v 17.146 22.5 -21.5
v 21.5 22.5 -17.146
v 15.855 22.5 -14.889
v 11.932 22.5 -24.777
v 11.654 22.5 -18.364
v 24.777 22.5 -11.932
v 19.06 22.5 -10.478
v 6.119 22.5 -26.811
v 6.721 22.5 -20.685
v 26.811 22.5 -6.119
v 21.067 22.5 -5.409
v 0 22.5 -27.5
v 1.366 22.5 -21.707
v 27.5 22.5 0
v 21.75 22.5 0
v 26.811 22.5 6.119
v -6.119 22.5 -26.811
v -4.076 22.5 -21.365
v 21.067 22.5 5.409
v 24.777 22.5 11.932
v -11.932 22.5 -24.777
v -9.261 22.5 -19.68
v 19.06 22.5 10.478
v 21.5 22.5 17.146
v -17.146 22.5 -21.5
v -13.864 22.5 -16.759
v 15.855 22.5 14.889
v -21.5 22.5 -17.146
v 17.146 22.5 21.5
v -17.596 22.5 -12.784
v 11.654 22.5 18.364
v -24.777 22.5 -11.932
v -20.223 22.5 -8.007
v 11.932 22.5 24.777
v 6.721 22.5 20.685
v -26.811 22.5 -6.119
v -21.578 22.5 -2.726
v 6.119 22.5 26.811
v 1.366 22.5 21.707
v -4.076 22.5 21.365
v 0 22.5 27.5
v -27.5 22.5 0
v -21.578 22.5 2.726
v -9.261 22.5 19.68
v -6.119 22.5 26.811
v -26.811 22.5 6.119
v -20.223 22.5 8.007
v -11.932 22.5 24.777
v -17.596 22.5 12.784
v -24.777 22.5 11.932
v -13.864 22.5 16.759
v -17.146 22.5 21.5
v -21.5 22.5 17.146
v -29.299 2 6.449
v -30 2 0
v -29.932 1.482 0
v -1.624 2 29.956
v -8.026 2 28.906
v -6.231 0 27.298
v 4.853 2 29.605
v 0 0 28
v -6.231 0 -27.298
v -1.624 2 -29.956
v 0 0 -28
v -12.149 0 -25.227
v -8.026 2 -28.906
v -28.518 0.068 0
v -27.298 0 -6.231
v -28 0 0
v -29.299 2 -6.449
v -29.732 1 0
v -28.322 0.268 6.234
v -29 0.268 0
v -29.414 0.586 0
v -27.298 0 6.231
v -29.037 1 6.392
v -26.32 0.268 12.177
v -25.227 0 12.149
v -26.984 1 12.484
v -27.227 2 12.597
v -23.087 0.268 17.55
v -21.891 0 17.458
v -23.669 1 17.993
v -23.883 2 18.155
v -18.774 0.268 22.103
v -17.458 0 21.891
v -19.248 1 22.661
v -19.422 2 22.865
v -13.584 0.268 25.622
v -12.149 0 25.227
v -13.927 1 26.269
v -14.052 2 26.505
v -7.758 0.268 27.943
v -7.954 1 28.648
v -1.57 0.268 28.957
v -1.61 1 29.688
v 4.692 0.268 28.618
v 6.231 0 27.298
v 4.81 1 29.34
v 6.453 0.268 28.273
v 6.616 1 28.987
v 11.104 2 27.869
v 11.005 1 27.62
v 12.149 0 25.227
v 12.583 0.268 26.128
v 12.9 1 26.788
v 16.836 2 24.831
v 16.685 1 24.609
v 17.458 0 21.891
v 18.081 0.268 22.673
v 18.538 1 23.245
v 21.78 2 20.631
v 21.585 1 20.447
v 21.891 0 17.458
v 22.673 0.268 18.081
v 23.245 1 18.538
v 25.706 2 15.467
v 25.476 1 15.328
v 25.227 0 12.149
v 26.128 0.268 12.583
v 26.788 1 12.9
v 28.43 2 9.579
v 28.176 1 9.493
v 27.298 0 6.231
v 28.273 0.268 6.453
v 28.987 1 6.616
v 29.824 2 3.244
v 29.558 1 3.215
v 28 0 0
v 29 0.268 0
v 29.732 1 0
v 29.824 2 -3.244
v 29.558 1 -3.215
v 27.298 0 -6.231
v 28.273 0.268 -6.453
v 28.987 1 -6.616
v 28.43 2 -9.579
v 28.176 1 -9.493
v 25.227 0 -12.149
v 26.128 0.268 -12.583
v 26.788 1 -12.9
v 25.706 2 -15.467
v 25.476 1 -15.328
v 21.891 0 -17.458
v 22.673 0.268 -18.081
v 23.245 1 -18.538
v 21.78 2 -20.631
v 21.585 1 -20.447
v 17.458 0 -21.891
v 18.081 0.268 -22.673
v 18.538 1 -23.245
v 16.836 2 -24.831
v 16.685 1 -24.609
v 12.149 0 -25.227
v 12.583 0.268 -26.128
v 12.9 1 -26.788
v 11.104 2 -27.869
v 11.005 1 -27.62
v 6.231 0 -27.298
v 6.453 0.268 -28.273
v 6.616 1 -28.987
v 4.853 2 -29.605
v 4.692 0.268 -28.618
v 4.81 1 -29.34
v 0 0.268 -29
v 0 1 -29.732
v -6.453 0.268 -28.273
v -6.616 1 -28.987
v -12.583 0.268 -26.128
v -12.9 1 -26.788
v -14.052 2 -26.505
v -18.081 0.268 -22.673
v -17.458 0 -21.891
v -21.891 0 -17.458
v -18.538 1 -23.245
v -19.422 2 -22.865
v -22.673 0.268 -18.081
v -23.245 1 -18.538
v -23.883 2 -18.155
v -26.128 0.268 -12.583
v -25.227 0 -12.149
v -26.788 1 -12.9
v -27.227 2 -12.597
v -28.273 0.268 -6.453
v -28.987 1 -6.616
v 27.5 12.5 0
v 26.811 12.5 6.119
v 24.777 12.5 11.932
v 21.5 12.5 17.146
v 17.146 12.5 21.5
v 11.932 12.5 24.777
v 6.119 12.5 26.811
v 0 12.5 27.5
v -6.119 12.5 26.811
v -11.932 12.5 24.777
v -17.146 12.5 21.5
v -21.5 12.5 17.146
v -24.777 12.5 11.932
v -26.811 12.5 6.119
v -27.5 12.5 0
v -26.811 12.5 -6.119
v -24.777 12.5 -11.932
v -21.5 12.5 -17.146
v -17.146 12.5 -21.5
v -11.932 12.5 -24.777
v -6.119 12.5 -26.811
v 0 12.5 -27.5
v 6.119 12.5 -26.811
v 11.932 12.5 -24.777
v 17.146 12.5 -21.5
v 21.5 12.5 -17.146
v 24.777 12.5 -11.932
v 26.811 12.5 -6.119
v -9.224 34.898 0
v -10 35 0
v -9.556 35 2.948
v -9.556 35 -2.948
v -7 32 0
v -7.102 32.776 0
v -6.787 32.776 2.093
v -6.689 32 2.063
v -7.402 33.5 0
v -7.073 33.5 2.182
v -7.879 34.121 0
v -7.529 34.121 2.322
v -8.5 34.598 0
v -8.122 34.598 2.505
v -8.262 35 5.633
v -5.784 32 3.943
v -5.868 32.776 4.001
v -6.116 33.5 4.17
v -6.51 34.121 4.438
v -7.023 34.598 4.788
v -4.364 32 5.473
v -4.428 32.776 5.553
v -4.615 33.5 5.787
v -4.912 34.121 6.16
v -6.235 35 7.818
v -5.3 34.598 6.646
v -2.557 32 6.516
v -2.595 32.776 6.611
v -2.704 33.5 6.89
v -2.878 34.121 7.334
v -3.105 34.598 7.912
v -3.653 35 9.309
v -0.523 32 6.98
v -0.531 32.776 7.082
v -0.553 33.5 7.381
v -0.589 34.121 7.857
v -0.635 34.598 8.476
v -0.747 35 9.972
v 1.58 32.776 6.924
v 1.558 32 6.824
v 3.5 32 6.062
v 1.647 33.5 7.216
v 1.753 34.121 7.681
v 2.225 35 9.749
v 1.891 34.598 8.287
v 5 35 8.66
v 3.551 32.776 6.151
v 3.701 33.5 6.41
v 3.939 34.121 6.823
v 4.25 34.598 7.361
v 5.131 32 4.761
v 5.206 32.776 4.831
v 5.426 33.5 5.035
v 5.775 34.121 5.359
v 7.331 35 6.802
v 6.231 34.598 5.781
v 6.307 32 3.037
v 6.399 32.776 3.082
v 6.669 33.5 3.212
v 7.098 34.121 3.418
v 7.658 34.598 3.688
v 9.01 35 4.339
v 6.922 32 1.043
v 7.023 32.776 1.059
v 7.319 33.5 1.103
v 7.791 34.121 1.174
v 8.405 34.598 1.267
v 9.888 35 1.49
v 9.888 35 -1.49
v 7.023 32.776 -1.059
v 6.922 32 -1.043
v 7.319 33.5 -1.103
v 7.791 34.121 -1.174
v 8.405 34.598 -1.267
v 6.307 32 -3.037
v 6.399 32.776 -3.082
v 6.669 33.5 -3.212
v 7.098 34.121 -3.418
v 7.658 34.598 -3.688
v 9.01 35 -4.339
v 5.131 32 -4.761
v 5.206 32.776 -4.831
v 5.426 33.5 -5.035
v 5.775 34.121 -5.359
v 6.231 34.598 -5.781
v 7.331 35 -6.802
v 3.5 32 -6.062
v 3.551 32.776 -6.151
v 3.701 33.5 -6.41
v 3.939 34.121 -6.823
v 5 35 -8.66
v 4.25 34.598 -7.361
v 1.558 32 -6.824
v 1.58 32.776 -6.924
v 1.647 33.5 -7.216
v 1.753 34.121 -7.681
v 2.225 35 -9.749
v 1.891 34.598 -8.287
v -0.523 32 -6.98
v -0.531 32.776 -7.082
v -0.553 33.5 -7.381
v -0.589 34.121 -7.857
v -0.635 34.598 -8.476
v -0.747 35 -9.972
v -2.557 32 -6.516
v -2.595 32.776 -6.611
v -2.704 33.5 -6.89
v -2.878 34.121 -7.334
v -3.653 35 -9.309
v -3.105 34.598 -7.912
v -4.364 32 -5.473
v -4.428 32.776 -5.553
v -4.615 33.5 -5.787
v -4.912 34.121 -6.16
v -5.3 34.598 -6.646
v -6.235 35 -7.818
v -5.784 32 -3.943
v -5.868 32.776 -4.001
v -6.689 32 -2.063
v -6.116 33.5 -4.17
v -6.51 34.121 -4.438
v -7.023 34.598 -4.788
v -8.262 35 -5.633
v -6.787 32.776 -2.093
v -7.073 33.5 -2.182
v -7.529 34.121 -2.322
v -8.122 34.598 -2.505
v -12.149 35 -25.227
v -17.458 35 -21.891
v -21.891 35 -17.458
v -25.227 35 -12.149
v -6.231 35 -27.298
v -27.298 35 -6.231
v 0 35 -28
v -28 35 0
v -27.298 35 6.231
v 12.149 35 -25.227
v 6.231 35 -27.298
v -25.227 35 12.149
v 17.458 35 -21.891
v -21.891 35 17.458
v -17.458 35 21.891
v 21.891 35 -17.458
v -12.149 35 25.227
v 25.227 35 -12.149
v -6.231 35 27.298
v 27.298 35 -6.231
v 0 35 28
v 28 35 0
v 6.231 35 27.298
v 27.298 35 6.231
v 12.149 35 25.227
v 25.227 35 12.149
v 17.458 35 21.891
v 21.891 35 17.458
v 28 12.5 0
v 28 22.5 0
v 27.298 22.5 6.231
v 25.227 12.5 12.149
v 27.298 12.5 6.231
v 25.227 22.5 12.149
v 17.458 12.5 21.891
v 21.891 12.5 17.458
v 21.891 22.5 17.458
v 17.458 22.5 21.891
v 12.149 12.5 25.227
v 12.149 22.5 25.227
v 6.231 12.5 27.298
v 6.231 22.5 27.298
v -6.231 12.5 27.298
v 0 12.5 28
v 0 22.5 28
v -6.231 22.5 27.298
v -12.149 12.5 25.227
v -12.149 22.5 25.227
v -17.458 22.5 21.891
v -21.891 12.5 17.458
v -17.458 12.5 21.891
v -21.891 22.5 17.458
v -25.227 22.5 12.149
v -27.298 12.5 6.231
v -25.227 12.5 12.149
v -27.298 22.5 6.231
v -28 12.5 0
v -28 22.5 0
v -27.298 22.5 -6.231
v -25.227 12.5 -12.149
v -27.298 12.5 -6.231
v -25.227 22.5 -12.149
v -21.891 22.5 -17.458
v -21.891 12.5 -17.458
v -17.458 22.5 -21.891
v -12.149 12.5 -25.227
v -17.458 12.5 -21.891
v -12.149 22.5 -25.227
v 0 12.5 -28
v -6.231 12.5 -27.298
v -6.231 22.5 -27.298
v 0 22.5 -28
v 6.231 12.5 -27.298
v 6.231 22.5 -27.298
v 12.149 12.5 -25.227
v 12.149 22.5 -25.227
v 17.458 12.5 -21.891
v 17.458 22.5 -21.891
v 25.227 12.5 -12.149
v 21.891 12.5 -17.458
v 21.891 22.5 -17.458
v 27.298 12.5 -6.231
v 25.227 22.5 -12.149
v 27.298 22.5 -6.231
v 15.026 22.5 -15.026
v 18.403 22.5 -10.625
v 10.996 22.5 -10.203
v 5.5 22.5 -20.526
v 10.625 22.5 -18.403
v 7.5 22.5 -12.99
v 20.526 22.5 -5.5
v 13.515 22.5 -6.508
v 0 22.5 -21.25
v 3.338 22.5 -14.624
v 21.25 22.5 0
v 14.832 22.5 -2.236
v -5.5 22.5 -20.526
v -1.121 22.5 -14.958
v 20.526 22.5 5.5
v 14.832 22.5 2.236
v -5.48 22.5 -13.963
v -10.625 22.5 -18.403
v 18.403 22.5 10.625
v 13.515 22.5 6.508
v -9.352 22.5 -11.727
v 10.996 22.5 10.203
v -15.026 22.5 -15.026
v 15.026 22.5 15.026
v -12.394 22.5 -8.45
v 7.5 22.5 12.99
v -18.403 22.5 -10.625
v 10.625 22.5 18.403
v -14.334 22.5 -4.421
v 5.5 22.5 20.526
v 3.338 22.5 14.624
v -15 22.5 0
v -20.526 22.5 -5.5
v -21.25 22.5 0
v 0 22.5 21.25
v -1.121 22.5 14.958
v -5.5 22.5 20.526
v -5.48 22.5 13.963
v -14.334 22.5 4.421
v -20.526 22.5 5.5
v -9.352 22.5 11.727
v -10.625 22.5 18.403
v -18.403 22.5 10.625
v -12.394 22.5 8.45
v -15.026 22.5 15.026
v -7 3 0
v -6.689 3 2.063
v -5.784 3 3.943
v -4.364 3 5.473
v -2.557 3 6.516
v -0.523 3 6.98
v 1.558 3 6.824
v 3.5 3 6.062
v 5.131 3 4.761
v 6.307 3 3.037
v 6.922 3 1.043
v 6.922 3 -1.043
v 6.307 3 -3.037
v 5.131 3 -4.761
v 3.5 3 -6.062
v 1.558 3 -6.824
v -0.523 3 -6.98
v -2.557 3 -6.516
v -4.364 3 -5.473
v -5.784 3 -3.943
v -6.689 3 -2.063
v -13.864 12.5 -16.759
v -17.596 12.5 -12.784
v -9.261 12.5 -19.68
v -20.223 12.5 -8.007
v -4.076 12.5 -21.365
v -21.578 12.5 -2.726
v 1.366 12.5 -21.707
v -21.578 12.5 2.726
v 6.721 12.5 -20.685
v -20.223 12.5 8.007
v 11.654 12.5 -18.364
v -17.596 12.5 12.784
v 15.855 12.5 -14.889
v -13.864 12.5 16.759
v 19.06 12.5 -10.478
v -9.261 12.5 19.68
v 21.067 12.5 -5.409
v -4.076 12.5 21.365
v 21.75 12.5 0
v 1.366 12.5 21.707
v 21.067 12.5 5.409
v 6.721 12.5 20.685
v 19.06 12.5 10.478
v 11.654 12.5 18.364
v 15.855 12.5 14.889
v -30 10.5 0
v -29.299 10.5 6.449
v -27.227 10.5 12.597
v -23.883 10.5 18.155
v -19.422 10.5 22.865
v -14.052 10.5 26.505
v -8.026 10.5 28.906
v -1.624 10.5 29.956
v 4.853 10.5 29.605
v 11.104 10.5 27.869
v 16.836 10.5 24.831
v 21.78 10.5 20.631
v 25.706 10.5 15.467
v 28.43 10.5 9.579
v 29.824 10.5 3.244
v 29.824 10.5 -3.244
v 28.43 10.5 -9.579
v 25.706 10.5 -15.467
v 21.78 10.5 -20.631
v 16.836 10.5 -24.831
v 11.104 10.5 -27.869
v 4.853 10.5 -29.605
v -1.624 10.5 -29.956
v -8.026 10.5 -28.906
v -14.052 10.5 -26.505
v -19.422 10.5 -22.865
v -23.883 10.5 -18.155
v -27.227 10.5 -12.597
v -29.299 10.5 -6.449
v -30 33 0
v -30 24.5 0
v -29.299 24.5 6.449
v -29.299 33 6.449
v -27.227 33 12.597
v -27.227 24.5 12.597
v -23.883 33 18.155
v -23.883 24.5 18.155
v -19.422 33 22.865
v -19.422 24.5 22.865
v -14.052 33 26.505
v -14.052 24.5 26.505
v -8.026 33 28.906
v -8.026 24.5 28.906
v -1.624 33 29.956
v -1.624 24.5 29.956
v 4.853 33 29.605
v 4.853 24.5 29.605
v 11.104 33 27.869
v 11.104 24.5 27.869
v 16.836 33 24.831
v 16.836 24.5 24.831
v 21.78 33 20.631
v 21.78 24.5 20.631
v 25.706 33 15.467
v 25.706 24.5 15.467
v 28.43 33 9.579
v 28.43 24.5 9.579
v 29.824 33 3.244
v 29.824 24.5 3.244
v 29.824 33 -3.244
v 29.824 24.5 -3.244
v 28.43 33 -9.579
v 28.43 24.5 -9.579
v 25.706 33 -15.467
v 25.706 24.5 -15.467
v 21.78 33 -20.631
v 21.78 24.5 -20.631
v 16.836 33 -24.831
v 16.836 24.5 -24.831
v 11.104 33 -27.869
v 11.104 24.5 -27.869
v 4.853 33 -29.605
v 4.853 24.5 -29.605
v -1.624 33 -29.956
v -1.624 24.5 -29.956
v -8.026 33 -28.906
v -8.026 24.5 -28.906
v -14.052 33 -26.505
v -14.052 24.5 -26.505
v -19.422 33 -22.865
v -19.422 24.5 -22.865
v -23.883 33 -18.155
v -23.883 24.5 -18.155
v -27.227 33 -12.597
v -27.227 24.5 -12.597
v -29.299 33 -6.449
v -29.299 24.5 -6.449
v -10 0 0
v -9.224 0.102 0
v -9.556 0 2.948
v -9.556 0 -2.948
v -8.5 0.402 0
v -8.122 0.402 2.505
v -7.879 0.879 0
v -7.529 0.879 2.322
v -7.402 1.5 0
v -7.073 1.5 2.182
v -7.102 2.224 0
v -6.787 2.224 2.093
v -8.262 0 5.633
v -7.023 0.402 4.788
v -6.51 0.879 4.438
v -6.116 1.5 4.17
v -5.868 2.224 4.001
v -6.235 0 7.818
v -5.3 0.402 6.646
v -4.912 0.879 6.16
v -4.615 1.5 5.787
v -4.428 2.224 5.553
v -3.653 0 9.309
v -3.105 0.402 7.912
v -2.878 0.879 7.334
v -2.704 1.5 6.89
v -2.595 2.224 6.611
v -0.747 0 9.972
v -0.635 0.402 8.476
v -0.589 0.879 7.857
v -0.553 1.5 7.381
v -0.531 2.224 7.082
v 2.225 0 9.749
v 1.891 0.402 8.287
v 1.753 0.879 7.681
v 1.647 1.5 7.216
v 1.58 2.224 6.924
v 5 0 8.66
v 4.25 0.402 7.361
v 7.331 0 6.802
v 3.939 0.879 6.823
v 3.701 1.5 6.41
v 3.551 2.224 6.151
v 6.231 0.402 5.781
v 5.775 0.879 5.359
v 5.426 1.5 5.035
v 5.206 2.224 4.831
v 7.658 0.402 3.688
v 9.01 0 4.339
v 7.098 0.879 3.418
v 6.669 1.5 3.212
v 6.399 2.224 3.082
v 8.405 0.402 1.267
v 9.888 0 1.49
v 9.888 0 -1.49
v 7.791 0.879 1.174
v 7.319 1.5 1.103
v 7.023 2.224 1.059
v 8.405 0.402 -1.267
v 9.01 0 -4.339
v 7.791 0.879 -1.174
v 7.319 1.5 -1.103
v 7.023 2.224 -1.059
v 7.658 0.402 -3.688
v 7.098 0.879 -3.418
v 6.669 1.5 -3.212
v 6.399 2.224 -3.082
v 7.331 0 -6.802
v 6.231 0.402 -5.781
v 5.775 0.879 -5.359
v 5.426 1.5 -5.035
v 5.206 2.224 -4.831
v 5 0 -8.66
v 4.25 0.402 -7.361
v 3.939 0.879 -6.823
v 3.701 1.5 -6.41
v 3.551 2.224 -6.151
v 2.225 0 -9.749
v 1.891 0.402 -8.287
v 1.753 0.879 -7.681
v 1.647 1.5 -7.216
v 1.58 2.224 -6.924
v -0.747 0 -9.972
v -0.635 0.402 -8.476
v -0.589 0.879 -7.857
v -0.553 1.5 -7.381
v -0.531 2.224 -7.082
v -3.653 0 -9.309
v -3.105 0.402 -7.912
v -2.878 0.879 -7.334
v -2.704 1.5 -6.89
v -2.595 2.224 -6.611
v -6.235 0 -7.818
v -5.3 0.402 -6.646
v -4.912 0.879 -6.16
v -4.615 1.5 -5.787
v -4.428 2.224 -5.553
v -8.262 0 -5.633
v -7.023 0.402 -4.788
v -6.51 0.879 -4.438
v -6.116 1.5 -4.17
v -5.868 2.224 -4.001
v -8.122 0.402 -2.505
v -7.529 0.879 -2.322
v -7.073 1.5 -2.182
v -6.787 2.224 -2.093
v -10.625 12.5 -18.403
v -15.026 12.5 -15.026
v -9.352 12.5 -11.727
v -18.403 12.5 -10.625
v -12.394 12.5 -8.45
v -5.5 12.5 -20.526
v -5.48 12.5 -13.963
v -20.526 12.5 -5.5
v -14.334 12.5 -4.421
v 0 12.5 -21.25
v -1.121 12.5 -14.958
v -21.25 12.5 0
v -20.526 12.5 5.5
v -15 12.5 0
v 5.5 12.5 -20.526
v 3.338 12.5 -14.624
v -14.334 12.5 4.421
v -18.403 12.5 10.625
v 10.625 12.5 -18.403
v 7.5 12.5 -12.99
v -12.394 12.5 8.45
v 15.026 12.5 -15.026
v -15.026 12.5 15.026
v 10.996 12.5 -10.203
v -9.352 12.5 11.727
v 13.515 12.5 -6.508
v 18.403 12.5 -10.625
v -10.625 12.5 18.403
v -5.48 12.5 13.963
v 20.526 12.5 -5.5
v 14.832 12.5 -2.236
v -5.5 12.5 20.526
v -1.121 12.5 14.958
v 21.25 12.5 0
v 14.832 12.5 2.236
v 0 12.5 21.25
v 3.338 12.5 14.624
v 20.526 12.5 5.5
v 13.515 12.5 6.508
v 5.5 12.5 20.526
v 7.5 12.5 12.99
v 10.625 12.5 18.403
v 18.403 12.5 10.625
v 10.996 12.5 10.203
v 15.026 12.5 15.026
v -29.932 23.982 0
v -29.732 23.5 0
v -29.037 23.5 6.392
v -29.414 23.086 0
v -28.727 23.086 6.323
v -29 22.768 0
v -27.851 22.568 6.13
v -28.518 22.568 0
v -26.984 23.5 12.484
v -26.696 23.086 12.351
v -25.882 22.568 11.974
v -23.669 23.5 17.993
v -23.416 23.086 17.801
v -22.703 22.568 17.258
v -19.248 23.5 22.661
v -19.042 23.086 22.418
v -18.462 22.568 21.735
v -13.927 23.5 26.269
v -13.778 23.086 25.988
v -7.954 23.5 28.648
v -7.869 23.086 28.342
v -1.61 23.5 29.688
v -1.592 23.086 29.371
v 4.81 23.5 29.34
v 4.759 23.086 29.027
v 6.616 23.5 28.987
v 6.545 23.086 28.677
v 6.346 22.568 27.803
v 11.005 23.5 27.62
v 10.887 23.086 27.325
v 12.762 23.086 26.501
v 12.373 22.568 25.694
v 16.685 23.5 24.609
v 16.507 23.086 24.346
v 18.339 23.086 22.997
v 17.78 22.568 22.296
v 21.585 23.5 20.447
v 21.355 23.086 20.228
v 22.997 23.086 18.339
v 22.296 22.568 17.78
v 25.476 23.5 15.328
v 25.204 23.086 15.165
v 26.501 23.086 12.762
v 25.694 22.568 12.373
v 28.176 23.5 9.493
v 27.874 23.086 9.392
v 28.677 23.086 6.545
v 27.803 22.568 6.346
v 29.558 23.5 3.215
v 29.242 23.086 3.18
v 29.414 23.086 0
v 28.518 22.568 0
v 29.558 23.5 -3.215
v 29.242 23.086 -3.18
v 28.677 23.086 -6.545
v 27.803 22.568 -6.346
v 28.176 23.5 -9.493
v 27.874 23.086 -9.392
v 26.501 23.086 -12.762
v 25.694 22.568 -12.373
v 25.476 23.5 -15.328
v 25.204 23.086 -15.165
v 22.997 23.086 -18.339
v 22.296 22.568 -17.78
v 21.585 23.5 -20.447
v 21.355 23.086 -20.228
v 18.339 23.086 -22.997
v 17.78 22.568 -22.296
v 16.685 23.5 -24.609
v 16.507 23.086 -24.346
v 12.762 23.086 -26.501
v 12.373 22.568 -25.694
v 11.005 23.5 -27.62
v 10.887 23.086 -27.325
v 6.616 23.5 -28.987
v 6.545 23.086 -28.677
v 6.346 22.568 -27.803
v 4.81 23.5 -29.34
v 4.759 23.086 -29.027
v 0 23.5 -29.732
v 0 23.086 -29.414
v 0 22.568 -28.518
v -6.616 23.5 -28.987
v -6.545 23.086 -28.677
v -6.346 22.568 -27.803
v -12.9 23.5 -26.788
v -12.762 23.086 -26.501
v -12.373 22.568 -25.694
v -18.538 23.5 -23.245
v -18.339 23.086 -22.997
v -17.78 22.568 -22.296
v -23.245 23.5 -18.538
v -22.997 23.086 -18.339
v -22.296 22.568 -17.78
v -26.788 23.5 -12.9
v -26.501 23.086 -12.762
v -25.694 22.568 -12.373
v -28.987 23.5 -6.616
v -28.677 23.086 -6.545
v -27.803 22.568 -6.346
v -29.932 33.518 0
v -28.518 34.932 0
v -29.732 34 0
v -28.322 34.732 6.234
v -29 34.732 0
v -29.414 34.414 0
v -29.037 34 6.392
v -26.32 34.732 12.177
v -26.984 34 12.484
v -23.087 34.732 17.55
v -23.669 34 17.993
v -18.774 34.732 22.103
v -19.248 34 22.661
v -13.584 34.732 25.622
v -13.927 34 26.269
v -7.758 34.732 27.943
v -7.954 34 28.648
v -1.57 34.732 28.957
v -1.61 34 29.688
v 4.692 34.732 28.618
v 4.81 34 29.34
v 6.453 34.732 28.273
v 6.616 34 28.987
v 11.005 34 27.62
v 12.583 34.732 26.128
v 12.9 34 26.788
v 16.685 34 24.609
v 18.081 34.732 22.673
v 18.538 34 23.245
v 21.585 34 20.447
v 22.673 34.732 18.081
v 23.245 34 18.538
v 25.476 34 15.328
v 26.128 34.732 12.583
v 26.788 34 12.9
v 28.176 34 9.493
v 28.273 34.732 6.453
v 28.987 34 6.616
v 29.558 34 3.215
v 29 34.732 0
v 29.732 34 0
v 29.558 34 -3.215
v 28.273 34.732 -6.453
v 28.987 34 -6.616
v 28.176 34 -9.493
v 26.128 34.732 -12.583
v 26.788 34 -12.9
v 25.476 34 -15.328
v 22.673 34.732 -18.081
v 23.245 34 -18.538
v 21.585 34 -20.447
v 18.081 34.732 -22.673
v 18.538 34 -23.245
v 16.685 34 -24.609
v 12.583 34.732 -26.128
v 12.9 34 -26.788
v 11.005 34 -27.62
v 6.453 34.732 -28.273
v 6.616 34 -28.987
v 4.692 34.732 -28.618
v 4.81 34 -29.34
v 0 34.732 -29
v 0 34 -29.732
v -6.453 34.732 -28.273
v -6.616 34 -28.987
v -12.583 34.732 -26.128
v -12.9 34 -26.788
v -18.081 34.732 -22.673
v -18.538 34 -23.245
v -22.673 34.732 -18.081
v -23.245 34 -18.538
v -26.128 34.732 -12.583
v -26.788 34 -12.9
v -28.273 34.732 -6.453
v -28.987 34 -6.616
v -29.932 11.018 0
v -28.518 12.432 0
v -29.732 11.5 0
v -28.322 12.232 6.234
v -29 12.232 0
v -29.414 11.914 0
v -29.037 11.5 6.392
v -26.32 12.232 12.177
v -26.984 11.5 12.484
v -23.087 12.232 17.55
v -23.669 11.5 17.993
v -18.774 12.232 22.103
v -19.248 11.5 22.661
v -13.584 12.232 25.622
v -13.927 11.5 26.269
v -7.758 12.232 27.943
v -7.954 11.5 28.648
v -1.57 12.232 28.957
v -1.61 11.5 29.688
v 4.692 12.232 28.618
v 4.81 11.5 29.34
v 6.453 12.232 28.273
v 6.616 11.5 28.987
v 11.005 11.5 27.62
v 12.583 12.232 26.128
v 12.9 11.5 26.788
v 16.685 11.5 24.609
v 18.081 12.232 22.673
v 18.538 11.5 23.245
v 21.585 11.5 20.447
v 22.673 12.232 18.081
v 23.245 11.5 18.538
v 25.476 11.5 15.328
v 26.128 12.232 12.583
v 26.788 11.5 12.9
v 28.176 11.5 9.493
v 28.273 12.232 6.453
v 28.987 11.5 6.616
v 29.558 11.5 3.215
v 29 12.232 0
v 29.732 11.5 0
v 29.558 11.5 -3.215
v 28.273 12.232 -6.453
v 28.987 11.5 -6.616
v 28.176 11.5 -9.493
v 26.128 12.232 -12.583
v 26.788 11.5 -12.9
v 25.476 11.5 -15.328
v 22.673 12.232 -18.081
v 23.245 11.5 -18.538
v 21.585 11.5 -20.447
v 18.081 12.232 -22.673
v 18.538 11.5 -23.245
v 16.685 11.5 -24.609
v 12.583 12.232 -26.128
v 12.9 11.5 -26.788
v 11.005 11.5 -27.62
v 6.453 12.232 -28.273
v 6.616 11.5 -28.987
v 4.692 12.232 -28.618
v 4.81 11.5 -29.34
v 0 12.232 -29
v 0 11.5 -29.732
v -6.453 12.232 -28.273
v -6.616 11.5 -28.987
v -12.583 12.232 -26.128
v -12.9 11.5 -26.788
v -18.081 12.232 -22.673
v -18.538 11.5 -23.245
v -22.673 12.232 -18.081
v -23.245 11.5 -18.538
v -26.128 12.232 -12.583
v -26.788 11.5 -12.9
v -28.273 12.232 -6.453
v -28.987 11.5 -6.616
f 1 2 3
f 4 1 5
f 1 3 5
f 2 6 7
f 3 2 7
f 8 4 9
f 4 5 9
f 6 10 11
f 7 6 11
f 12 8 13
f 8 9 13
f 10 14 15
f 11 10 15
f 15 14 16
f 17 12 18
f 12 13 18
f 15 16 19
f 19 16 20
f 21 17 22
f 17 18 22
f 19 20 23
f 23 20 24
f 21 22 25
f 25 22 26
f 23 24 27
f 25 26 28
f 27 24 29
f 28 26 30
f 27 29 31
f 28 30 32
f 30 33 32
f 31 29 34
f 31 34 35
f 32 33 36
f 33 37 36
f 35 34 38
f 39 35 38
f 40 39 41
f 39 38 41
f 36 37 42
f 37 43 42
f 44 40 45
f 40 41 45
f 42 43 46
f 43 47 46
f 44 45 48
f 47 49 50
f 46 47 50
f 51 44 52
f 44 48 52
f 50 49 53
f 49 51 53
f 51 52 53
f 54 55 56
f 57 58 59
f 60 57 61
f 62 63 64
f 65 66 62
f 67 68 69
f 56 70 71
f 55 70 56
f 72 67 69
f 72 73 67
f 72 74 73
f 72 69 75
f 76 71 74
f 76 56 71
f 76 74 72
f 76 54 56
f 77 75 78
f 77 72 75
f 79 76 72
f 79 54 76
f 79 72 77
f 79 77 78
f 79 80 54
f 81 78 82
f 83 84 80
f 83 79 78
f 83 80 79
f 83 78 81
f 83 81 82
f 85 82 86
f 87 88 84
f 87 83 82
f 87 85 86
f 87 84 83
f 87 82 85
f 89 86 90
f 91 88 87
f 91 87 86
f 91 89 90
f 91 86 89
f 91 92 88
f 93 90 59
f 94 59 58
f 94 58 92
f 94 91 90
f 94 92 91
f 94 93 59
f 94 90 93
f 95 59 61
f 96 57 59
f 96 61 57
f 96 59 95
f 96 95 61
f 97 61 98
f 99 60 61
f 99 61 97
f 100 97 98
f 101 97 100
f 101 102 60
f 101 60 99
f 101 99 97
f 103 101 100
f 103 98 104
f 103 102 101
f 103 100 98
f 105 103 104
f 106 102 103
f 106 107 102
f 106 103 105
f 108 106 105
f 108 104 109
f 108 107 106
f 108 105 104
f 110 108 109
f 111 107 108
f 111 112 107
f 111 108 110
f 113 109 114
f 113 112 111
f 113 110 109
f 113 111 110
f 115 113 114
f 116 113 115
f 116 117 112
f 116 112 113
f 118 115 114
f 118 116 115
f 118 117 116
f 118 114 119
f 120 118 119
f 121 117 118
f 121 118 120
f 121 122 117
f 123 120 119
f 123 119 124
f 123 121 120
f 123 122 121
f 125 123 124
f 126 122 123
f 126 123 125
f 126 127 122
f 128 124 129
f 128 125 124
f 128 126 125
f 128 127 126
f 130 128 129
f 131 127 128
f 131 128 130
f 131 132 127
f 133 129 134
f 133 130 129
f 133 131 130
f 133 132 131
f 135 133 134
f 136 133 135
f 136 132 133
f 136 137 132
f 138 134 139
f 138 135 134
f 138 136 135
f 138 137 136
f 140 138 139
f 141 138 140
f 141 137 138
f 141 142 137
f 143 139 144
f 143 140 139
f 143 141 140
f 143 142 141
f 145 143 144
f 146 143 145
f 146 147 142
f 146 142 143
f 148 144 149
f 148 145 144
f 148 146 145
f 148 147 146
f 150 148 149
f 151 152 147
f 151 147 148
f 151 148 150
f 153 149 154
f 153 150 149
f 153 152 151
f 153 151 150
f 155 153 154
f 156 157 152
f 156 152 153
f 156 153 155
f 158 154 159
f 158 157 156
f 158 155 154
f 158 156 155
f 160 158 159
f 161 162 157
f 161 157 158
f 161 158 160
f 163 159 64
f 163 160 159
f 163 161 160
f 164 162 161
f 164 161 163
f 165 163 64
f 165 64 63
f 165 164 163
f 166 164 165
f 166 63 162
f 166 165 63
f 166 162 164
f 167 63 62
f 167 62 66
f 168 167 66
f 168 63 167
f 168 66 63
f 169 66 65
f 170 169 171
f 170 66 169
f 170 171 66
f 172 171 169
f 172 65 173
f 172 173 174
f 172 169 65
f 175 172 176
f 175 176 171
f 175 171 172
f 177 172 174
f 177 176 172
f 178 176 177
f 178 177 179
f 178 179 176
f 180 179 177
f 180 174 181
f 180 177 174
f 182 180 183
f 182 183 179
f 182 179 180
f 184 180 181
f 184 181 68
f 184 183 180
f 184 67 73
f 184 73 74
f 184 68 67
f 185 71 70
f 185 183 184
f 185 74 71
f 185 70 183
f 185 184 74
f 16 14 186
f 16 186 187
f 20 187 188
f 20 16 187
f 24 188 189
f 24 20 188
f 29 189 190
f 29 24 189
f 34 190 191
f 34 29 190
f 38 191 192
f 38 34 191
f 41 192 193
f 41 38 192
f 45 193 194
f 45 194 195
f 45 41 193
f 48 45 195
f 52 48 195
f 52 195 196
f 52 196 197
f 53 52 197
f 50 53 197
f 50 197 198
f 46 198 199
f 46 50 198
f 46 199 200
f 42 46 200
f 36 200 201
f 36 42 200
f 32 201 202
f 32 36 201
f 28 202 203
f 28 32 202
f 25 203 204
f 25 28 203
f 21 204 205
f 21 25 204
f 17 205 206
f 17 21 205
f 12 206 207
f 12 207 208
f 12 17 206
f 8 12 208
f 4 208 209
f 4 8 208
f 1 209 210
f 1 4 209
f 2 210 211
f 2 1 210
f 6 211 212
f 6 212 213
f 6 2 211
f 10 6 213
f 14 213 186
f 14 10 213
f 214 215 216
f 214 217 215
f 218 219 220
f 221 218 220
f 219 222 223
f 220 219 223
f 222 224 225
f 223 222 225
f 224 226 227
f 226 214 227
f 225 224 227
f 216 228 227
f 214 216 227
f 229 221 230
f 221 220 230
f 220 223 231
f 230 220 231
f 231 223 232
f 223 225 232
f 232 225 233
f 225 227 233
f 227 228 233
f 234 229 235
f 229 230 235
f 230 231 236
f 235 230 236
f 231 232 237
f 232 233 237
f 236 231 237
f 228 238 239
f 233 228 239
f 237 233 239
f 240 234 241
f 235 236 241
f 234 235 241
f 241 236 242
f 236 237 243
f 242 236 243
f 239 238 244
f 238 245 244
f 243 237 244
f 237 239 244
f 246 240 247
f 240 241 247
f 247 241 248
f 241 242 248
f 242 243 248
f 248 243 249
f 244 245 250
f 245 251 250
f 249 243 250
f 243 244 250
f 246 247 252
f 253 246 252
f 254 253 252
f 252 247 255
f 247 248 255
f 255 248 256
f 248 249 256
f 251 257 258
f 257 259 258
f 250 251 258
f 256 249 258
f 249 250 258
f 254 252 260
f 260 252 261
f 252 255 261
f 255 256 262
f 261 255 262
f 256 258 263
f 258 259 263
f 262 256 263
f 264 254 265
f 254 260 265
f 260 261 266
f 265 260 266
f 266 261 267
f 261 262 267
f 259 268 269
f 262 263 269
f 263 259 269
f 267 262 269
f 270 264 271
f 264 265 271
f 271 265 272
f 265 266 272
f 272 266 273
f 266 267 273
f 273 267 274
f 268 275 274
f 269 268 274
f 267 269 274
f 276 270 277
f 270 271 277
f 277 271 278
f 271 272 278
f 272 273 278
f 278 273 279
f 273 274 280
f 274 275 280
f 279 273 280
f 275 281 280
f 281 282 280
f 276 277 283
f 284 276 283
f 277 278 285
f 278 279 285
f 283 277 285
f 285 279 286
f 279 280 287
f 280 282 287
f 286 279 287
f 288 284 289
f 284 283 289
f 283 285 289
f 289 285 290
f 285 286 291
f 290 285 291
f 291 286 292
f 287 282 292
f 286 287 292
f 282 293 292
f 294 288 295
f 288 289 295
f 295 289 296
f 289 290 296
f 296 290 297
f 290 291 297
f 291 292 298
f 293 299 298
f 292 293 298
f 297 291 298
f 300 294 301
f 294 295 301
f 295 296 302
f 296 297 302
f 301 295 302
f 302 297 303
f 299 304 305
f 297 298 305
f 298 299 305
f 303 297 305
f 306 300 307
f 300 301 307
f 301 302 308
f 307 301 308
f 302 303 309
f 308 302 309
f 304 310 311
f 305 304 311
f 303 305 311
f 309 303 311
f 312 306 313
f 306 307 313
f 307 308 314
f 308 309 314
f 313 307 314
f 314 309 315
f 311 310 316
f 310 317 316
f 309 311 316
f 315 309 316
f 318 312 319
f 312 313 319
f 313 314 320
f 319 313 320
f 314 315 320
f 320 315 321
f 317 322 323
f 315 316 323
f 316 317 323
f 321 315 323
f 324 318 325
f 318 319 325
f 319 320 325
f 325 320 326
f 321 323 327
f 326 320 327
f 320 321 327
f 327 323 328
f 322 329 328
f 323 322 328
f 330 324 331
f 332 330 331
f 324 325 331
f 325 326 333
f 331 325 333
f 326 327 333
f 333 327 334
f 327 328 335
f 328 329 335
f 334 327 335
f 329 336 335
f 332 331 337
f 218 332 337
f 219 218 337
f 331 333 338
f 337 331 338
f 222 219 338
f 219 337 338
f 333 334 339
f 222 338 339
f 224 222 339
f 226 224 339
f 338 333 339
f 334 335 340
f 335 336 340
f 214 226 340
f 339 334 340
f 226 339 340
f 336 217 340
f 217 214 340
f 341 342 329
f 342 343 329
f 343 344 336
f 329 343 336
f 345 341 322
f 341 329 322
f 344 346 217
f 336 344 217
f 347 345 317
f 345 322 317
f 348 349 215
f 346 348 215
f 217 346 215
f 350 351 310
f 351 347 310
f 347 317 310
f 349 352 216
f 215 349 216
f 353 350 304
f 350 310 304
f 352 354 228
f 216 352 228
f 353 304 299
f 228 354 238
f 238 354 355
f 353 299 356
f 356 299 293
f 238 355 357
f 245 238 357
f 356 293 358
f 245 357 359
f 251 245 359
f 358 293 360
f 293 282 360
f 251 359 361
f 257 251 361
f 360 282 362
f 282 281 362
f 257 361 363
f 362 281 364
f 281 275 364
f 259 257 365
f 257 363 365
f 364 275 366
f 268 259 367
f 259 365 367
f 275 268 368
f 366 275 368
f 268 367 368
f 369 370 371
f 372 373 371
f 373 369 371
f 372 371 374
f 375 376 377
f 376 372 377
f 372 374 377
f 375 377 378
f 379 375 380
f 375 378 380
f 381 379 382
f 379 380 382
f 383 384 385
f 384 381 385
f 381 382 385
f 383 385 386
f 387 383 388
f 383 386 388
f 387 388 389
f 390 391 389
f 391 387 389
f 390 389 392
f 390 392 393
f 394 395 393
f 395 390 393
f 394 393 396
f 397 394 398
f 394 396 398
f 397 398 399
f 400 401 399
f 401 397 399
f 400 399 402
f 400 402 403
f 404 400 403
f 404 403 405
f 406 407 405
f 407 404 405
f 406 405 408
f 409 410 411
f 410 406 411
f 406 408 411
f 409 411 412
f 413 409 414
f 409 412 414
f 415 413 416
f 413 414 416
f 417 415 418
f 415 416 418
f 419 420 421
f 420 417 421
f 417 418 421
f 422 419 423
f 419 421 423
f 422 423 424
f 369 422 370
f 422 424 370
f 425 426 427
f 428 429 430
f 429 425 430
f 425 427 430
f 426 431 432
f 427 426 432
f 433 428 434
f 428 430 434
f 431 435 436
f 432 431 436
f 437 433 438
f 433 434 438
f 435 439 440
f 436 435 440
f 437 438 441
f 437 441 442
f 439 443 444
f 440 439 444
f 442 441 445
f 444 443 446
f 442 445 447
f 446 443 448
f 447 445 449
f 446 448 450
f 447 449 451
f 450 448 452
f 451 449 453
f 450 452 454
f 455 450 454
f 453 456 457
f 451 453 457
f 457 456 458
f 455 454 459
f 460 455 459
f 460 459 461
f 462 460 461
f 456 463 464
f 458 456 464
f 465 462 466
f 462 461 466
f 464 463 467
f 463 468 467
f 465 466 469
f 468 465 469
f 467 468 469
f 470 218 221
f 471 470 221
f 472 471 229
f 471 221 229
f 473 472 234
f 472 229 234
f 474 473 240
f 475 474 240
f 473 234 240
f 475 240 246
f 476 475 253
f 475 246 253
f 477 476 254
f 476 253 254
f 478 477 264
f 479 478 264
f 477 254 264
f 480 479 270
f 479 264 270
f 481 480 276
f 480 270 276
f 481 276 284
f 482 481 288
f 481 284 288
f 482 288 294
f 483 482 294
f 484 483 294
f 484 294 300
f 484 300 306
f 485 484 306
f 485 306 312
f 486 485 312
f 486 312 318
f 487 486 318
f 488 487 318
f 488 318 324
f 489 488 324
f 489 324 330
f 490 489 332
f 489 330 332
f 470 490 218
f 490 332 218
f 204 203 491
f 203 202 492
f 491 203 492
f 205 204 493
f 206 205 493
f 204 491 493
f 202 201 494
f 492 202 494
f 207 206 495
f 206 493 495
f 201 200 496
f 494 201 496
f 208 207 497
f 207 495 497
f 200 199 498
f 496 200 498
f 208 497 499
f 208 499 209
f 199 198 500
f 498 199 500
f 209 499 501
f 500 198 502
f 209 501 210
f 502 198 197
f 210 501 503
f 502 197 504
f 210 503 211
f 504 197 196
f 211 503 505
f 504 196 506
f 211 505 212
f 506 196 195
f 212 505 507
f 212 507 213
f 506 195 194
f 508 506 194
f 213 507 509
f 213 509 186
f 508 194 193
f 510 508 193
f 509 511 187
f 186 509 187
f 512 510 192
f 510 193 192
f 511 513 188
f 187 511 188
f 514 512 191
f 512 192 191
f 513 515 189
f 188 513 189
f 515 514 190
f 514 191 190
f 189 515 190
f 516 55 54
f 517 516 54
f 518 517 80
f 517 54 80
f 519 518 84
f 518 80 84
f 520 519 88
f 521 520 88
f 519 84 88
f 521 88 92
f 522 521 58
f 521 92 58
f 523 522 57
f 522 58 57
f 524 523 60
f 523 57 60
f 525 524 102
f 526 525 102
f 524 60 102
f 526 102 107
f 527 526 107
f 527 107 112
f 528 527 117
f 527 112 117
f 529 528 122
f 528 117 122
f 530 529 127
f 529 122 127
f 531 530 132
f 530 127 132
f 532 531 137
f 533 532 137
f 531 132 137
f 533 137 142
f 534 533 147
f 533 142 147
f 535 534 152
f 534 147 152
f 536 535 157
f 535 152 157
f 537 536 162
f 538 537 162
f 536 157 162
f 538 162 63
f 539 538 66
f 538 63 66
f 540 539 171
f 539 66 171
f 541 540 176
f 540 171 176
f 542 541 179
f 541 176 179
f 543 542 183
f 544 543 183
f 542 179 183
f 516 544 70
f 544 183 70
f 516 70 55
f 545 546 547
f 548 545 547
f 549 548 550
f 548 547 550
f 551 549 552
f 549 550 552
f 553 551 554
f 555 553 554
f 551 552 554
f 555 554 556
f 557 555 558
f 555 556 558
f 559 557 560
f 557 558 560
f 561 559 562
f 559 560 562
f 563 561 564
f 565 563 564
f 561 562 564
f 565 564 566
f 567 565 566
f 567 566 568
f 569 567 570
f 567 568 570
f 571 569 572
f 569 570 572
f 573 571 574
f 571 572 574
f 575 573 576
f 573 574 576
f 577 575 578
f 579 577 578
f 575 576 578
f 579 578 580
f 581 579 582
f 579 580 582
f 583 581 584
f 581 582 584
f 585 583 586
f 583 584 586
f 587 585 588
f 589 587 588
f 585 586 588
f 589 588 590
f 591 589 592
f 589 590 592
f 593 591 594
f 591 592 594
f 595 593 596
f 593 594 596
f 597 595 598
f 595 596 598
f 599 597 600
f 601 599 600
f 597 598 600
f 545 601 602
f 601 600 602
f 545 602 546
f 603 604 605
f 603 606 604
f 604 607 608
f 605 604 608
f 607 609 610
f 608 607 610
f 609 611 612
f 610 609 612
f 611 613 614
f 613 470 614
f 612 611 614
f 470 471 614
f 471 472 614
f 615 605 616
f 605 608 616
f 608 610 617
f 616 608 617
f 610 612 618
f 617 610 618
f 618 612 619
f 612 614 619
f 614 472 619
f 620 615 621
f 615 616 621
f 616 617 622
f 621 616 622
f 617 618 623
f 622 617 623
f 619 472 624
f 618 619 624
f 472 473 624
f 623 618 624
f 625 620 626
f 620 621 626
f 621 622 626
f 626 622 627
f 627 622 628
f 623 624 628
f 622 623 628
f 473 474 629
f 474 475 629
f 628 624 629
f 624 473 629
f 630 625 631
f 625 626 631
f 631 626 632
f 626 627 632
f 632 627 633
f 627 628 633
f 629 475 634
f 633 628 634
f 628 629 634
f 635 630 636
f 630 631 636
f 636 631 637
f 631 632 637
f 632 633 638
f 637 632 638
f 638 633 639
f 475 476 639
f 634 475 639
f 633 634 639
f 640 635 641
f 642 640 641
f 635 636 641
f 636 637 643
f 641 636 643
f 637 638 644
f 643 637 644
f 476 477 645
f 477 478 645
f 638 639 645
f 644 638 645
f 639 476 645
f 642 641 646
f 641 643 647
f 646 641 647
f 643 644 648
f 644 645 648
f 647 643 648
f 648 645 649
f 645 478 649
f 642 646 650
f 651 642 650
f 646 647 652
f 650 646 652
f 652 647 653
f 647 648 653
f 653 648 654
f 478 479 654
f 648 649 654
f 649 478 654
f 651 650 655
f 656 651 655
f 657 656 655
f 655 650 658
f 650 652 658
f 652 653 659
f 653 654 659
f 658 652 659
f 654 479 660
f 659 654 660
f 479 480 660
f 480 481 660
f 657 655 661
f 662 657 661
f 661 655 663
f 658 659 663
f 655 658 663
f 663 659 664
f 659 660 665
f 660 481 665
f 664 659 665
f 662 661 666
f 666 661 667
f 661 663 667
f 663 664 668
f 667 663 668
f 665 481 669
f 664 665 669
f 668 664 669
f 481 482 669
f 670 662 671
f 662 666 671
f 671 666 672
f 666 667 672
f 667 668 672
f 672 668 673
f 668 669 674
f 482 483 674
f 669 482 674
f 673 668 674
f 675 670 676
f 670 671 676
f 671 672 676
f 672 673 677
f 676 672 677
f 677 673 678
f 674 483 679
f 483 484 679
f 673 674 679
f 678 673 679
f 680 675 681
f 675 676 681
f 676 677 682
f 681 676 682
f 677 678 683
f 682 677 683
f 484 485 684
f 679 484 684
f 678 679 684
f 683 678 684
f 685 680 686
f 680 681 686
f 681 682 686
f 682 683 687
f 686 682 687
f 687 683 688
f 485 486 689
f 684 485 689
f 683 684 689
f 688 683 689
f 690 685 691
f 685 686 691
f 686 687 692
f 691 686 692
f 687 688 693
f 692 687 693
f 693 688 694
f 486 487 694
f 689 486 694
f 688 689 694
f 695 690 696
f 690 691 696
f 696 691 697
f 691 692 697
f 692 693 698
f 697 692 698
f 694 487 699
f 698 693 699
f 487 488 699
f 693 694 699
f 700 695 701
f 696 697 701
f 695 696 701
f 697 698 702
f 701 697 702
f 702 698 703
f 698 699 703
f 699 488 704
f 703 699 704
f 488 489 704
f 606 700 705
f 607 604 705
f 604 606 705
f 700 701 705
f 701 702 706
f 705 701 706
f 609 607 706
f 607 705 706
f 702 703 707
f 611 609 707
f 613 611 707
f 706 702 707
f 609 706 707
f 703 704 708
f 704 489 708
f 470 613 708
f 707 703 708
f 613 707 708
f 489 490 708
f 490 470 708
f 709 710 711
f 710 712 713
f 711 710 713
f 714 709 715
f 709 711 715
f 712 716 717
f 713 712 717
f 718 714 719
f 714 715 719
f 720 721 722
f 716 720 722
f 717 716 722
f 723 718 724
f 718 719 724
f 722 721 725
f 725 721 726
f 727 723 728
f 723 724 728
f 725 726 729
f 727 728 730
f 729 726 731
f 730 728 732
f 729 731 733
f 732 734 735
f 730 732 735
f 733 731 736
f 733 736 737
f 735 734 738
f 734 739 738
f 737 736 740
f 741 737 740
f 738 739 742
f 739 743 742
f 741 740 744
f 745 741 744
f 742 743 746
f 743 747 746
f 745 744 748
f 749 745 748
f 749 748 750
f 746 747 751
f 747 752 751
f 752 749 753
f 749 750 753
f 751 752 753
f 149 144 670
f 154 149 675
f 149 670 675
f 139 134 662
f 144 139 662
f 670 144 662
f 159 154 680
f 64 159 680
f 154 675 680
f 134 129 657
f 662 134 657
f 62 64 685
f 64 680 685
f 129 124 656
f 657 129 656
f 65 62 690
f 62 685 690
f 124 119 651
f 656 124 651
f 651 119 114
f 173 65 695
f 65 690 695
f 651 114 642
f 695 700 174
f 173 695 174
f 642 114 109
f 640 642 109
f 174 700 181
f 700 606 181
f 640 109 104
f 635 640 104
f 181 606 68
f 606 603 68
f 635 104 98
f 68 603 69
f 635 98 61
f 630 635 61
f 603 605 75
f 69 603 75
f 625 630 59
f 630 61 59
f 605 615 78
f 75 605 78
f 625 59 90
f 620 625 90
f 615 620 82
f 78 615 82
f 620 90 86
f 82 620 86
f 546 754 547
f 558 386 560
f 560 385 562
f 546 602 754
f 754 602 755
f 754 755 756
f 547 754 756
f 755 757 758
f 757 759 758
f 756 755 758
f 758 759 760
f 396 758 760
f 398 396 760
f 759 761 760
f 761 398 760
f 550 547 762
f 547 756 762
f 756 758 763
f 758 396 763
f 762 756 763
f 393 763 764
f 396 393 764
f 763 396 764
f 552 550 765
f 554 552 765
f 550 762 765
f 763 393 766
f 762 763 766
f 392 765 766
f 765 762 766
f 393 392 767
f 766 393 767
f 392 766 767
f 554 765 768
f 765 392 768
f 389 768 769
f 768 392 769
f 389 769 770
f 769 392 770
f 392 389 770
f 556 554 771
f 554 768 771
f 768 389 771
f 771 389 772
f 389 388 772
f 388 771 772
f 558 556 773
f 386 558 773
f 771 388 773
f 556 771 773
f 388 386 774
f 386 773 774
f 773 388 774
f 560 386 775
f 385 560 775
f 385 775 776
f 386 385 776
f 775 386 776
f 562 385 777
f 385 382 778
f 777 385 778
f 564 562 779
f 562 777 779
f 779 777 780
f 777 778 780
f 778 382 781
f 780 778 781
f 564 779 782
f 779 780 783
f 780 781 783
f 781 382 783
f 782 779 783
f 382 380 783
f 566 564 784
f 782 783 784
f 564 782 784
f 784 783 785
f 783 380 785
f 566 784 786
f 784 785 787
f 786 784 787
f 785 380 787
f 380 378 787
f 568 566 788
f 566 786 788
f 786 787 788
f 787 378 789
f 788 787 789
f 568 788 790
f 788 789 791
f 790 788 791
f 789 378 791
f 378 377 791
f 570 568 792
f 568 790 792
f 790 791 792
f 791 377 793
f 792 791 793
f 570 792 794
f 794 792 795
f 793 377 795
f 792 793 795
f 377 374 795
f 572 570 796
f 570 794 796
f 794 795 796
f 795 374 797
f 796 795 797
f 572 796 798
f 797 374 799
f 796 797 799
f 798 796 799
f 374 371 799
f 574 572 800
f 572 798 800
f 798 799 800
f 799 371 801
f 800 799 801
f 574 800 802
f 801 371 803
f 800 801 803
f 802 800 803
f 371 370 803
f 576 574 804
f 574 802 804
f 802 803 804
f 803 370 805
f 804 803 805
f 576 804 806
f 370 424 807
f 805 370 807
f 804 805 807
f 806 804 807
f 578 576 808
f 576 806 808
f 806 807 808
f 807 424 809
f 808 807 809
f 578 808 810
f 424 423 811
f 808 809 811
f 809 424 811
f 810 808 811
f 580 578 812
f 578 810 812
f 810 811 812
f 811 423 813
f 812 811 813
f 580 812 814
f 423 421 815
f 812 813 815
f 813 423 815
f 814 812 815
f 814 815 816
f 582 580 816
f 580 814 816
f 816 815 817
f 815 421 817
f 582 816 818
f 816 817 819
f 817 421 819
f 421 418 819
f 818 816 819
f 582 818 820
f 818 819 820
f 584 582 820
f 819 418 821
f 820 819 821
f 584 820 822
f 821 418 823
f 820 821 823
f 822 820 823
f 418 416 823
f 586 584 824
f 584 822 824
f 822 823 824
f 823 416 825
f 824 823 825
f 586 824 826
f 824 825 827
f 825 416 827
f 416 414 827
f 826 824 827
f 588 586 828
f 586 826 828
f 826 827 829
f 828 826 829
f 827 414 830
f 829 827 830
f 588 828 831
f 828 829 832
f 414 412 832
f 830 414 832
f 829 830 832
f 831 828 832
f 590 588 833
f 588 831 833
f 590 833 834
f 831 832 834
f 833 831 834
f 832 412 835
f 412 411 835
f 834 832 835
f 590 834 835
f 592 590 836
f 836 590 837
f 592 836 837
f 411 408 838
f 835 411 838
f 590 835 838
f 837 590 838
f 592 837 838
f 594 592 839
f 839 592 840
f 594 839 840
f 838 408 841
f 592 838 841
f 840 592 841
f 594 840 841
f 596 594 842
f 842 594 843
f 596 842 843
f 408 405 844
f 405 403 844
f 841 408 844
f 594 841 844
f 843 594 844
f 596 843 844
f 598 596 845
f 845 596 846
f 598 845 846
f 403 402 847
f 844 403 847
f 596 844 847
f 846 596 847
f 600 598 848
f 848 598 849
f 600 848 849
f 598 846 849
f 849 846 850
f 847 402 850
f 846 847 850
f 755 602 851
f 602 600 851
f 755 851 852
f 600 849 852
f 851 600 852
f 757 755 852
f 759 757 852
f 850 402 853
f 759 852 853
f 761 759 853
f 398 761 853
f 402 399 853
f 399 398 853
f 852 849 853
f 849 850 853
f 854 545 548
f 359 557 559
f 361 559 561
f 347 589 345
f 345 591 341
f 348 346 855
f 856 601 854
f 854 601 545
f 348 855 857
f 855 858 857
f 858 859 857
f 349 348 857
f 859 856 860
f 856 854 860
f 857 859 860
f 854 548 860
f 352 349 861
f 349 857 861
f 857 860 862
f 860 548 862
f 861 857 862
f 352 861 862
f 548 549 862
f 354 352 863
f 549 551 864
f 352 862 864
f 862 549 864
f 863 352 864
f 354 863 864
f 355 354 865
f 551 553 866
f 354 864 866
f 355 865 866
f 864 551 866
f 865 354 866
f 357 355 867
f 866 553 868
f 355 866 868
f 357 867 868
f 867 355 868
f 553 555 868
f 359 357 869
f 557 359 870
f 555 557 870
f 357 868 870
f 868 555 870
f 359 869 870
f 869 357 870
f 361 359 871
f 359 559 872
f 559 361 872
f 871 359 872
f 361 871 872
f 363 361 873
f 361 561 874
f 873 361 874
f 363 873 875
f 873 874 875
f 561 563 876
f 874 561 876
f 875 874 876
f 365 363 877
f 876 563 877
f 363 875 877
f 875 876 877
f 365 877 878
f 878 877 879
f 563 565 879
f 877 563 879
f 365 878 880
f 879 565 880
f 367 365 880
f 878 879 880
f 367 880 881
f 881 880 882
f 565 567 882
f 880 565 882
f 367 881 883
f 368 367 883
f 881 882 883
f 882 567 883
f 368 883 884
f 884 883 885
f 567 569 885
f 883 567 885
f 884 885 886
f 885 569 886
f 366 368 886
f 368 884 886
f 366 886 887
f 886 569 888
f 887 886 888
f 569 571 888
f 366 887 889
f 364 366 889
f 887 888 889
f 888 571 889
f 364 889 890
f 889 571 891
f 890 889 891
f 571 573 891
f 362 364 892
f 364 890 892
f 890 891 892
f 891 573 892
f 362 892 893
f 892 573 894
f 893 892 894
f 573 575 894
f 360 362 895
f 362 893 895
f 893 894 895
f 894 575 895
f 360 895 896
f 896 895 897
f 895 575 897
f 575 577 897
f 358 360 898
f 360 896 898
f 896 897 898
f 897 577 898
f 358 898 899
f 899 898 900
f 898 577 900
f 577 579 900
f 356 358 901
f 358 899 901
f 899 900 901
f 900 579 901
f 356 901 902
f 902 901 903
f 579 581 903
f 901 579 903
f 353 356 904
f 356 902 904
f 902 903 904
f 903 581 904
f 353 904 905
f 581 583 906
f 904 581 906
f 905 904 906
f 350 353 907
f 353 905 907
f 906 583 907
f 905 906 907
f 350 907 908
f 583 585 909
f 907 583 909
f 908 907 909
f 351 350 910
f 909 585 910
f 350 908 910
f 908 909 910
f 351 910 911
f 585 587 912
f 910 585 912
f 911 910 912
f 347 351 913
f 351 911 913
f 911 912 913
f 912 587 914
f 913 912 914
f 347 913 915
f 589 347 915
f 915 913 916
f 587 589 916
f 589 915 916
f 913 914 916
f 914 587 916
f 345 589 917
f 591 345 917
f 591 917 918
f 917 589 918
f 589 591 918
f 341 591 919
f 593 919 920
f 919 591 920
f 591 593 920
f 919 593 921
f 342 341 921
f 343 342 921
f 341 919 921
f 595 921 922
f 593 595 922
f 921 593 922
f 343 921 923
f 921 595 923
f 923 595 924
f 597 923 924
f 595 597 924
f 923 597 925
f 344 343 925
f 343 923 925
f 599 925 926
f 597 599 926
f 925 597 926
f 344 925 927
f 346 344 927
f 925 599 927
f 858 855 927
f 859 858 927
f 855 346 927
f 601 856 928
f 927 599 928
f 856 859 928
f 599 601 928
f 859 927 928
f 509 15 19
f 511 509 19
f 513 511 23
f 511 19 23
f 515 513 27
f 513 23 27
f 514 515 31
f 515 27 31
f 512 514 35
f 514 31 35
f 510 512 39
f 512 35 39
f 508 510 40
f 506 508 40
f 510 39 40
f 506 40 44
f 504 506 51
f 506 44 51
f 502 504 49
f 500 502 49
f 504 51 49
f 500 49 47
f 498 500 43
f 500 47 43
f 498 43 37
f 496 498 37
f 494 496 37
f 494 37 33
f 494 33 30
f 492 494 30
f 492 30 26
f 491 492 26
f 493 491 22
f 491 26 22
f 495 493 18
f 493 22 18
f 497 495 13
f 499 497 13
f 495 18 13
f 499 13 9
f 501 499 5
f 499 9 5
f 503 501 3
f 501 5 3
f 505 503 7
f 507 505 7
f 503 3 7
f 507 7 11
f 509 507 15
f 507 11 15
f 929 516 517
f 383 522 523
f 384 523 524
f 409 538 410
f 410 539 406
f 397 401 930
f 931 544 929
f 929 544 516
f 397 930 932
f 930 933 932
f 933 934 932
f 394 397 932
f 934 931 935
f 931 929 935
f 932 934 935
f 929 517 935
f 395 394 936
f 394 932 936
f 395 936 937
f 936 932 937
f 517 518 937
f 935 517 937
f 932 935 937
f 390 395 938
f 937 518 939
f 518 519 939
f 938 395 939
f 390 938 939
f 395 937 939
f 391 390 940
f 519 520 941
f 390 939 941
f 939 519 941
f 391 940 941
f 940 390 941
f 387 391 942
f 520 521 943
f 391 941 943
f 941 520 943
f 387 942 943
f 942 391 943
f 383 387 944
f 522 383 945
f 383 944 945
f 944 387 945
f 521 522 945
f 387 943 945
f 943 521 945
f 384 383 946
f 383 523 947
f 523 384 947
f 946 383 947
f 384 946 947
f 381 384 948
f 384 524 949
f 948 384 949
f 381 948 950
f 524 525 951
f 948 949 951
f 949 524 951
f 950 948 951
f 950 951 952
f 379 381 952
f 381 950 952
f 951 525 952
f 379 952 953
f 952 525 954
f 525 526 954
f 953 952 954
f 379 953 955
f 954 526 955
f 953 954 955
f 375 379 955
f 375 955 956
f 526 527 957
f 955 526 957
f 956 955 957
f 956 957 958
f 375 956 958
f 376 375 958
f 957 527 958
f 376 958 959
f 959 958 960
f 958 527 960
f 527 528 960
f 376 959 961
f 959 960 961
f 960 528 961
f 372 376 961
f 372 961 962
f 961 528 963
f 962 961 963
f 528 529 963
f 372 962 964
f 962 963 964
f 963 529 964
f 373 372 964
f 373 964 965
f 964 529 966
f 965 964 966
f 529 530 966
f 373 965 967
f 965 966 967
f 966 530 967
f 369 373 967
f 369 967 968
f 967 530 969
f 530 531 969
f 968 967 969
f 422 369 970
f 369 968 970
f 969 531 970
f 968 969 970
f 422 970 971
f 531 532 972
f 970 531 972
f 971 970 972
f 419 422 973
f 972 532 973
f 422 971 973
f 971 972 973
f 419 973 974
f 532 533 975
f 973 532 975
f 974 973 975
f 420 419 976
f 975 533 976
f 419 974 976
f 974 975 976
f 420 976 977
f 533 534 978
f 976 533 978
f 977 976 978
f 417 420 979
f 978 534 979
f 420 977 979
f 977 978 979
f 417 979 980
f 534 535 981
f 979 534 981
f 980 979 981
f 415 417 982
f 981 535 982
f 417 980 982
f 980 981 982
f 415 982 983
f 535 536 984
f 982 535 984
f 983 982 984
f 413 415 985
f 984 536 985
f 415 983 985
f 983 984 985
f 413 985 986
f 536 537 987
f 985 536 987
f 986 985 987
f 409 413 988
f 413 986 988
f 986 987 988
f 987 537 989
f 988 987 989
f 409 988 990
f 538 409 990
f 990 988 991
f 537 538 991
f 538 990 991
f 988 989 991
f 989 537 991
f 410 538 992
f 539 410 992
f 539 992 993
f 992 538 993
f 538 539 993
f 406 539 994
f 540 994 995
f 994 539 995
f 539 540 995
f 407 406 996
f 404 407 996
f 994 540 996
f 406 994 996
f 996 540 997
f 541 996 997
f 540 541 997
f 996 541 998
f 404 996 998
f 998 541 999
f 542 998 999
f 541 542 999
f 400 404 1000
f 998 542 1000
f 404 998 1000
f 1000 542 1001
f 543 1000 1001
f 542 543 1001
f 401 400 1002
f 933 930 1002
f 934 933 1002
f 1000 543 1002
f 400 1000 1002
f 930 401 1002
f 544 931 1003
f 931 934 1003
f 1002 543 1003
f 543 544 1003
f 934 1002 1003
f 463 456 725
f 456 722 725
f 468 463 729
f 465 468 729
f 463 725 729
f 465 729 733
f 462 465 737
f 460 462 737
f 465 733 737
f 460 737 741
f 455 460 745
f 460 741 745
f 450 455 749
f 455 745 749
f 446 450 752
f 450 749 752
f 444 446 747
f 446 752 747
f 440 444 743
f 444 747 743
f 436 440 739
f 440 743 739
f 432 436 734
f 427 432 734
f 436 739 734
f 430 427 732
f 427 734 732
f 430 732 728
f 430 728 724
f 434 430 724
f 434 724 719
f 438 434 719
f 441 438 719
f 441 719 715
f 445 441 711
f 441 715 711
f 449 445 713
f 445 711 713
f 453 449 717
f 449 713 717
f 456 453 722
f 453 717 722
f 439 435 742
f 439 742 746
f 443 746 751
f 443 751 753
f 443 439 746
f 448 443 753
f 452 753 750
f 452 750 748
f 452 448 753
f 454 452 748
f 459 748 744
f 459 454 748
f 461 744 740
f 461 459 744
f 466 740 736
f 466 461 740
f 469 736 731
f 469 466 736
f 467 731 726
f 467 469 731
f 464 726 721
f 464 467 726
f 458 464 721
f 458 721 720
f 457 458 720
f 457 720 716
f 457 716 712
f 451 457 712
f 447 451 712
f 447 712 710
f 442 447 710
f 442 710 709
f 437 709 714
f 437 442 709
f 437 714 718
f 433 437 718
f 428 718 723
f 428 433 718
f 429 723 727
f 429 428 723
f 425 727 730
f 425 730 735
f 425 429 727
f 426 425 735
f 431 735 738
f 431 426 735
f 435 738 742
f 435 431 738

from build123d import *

# Parameters (mm, degrees)
F2_R     = 2
F3_R     = 3
F4_R     = 28
F4_R_2   = 27.5
F4_R_3   = 21.75
F4_R_4   = 21.25
F5_DEPTH = 10


with BuildPart() as f1:
    # F0 (on Top) → F1 (revolve)
    with BuildSketch(Plane.XY):
        Polygon((-30, 0), (-7, 0), (-7, 35), (-30, 35), (-30, 22.5), (-15, 22.5), (-15, 12.5), (-30, 12.5), align=None)
    revolve(axis=Axis((0, 17.5, 0), (0, 1, 0)))

    # F2
    f2_edges = [f1.edges().sort_by_distance(p)[0] for p in [
        (30, 22.5, 0),
        (30, 12.5, 0),
        (30, 35, 0),
        (30, 0, 0),
    ]]
    fillet(f2_edges, radius=F2_R)

    # F3
    f3_edges = [f1.edges().sort_by_distance(p)[0] for p in [
        (7, 0, 0),
        (7, 35, 0),
    ]]
    fillet(f3_edges, radius=F3_R)

    # F4 (on face) → F5 (join, through all)
    with BuildSketch(Plane.XZ.offset(-22.5)):
        Circle(F4_R)
        Circle(F4_R_2, mode=Mode.SUBTRACT)
        Circle(F4_R_3)
        Circle(F4_R_4, mode=Mode.SUBTRACT)
    extrude(amount=F5_DEPTH)


solid = f1.part
